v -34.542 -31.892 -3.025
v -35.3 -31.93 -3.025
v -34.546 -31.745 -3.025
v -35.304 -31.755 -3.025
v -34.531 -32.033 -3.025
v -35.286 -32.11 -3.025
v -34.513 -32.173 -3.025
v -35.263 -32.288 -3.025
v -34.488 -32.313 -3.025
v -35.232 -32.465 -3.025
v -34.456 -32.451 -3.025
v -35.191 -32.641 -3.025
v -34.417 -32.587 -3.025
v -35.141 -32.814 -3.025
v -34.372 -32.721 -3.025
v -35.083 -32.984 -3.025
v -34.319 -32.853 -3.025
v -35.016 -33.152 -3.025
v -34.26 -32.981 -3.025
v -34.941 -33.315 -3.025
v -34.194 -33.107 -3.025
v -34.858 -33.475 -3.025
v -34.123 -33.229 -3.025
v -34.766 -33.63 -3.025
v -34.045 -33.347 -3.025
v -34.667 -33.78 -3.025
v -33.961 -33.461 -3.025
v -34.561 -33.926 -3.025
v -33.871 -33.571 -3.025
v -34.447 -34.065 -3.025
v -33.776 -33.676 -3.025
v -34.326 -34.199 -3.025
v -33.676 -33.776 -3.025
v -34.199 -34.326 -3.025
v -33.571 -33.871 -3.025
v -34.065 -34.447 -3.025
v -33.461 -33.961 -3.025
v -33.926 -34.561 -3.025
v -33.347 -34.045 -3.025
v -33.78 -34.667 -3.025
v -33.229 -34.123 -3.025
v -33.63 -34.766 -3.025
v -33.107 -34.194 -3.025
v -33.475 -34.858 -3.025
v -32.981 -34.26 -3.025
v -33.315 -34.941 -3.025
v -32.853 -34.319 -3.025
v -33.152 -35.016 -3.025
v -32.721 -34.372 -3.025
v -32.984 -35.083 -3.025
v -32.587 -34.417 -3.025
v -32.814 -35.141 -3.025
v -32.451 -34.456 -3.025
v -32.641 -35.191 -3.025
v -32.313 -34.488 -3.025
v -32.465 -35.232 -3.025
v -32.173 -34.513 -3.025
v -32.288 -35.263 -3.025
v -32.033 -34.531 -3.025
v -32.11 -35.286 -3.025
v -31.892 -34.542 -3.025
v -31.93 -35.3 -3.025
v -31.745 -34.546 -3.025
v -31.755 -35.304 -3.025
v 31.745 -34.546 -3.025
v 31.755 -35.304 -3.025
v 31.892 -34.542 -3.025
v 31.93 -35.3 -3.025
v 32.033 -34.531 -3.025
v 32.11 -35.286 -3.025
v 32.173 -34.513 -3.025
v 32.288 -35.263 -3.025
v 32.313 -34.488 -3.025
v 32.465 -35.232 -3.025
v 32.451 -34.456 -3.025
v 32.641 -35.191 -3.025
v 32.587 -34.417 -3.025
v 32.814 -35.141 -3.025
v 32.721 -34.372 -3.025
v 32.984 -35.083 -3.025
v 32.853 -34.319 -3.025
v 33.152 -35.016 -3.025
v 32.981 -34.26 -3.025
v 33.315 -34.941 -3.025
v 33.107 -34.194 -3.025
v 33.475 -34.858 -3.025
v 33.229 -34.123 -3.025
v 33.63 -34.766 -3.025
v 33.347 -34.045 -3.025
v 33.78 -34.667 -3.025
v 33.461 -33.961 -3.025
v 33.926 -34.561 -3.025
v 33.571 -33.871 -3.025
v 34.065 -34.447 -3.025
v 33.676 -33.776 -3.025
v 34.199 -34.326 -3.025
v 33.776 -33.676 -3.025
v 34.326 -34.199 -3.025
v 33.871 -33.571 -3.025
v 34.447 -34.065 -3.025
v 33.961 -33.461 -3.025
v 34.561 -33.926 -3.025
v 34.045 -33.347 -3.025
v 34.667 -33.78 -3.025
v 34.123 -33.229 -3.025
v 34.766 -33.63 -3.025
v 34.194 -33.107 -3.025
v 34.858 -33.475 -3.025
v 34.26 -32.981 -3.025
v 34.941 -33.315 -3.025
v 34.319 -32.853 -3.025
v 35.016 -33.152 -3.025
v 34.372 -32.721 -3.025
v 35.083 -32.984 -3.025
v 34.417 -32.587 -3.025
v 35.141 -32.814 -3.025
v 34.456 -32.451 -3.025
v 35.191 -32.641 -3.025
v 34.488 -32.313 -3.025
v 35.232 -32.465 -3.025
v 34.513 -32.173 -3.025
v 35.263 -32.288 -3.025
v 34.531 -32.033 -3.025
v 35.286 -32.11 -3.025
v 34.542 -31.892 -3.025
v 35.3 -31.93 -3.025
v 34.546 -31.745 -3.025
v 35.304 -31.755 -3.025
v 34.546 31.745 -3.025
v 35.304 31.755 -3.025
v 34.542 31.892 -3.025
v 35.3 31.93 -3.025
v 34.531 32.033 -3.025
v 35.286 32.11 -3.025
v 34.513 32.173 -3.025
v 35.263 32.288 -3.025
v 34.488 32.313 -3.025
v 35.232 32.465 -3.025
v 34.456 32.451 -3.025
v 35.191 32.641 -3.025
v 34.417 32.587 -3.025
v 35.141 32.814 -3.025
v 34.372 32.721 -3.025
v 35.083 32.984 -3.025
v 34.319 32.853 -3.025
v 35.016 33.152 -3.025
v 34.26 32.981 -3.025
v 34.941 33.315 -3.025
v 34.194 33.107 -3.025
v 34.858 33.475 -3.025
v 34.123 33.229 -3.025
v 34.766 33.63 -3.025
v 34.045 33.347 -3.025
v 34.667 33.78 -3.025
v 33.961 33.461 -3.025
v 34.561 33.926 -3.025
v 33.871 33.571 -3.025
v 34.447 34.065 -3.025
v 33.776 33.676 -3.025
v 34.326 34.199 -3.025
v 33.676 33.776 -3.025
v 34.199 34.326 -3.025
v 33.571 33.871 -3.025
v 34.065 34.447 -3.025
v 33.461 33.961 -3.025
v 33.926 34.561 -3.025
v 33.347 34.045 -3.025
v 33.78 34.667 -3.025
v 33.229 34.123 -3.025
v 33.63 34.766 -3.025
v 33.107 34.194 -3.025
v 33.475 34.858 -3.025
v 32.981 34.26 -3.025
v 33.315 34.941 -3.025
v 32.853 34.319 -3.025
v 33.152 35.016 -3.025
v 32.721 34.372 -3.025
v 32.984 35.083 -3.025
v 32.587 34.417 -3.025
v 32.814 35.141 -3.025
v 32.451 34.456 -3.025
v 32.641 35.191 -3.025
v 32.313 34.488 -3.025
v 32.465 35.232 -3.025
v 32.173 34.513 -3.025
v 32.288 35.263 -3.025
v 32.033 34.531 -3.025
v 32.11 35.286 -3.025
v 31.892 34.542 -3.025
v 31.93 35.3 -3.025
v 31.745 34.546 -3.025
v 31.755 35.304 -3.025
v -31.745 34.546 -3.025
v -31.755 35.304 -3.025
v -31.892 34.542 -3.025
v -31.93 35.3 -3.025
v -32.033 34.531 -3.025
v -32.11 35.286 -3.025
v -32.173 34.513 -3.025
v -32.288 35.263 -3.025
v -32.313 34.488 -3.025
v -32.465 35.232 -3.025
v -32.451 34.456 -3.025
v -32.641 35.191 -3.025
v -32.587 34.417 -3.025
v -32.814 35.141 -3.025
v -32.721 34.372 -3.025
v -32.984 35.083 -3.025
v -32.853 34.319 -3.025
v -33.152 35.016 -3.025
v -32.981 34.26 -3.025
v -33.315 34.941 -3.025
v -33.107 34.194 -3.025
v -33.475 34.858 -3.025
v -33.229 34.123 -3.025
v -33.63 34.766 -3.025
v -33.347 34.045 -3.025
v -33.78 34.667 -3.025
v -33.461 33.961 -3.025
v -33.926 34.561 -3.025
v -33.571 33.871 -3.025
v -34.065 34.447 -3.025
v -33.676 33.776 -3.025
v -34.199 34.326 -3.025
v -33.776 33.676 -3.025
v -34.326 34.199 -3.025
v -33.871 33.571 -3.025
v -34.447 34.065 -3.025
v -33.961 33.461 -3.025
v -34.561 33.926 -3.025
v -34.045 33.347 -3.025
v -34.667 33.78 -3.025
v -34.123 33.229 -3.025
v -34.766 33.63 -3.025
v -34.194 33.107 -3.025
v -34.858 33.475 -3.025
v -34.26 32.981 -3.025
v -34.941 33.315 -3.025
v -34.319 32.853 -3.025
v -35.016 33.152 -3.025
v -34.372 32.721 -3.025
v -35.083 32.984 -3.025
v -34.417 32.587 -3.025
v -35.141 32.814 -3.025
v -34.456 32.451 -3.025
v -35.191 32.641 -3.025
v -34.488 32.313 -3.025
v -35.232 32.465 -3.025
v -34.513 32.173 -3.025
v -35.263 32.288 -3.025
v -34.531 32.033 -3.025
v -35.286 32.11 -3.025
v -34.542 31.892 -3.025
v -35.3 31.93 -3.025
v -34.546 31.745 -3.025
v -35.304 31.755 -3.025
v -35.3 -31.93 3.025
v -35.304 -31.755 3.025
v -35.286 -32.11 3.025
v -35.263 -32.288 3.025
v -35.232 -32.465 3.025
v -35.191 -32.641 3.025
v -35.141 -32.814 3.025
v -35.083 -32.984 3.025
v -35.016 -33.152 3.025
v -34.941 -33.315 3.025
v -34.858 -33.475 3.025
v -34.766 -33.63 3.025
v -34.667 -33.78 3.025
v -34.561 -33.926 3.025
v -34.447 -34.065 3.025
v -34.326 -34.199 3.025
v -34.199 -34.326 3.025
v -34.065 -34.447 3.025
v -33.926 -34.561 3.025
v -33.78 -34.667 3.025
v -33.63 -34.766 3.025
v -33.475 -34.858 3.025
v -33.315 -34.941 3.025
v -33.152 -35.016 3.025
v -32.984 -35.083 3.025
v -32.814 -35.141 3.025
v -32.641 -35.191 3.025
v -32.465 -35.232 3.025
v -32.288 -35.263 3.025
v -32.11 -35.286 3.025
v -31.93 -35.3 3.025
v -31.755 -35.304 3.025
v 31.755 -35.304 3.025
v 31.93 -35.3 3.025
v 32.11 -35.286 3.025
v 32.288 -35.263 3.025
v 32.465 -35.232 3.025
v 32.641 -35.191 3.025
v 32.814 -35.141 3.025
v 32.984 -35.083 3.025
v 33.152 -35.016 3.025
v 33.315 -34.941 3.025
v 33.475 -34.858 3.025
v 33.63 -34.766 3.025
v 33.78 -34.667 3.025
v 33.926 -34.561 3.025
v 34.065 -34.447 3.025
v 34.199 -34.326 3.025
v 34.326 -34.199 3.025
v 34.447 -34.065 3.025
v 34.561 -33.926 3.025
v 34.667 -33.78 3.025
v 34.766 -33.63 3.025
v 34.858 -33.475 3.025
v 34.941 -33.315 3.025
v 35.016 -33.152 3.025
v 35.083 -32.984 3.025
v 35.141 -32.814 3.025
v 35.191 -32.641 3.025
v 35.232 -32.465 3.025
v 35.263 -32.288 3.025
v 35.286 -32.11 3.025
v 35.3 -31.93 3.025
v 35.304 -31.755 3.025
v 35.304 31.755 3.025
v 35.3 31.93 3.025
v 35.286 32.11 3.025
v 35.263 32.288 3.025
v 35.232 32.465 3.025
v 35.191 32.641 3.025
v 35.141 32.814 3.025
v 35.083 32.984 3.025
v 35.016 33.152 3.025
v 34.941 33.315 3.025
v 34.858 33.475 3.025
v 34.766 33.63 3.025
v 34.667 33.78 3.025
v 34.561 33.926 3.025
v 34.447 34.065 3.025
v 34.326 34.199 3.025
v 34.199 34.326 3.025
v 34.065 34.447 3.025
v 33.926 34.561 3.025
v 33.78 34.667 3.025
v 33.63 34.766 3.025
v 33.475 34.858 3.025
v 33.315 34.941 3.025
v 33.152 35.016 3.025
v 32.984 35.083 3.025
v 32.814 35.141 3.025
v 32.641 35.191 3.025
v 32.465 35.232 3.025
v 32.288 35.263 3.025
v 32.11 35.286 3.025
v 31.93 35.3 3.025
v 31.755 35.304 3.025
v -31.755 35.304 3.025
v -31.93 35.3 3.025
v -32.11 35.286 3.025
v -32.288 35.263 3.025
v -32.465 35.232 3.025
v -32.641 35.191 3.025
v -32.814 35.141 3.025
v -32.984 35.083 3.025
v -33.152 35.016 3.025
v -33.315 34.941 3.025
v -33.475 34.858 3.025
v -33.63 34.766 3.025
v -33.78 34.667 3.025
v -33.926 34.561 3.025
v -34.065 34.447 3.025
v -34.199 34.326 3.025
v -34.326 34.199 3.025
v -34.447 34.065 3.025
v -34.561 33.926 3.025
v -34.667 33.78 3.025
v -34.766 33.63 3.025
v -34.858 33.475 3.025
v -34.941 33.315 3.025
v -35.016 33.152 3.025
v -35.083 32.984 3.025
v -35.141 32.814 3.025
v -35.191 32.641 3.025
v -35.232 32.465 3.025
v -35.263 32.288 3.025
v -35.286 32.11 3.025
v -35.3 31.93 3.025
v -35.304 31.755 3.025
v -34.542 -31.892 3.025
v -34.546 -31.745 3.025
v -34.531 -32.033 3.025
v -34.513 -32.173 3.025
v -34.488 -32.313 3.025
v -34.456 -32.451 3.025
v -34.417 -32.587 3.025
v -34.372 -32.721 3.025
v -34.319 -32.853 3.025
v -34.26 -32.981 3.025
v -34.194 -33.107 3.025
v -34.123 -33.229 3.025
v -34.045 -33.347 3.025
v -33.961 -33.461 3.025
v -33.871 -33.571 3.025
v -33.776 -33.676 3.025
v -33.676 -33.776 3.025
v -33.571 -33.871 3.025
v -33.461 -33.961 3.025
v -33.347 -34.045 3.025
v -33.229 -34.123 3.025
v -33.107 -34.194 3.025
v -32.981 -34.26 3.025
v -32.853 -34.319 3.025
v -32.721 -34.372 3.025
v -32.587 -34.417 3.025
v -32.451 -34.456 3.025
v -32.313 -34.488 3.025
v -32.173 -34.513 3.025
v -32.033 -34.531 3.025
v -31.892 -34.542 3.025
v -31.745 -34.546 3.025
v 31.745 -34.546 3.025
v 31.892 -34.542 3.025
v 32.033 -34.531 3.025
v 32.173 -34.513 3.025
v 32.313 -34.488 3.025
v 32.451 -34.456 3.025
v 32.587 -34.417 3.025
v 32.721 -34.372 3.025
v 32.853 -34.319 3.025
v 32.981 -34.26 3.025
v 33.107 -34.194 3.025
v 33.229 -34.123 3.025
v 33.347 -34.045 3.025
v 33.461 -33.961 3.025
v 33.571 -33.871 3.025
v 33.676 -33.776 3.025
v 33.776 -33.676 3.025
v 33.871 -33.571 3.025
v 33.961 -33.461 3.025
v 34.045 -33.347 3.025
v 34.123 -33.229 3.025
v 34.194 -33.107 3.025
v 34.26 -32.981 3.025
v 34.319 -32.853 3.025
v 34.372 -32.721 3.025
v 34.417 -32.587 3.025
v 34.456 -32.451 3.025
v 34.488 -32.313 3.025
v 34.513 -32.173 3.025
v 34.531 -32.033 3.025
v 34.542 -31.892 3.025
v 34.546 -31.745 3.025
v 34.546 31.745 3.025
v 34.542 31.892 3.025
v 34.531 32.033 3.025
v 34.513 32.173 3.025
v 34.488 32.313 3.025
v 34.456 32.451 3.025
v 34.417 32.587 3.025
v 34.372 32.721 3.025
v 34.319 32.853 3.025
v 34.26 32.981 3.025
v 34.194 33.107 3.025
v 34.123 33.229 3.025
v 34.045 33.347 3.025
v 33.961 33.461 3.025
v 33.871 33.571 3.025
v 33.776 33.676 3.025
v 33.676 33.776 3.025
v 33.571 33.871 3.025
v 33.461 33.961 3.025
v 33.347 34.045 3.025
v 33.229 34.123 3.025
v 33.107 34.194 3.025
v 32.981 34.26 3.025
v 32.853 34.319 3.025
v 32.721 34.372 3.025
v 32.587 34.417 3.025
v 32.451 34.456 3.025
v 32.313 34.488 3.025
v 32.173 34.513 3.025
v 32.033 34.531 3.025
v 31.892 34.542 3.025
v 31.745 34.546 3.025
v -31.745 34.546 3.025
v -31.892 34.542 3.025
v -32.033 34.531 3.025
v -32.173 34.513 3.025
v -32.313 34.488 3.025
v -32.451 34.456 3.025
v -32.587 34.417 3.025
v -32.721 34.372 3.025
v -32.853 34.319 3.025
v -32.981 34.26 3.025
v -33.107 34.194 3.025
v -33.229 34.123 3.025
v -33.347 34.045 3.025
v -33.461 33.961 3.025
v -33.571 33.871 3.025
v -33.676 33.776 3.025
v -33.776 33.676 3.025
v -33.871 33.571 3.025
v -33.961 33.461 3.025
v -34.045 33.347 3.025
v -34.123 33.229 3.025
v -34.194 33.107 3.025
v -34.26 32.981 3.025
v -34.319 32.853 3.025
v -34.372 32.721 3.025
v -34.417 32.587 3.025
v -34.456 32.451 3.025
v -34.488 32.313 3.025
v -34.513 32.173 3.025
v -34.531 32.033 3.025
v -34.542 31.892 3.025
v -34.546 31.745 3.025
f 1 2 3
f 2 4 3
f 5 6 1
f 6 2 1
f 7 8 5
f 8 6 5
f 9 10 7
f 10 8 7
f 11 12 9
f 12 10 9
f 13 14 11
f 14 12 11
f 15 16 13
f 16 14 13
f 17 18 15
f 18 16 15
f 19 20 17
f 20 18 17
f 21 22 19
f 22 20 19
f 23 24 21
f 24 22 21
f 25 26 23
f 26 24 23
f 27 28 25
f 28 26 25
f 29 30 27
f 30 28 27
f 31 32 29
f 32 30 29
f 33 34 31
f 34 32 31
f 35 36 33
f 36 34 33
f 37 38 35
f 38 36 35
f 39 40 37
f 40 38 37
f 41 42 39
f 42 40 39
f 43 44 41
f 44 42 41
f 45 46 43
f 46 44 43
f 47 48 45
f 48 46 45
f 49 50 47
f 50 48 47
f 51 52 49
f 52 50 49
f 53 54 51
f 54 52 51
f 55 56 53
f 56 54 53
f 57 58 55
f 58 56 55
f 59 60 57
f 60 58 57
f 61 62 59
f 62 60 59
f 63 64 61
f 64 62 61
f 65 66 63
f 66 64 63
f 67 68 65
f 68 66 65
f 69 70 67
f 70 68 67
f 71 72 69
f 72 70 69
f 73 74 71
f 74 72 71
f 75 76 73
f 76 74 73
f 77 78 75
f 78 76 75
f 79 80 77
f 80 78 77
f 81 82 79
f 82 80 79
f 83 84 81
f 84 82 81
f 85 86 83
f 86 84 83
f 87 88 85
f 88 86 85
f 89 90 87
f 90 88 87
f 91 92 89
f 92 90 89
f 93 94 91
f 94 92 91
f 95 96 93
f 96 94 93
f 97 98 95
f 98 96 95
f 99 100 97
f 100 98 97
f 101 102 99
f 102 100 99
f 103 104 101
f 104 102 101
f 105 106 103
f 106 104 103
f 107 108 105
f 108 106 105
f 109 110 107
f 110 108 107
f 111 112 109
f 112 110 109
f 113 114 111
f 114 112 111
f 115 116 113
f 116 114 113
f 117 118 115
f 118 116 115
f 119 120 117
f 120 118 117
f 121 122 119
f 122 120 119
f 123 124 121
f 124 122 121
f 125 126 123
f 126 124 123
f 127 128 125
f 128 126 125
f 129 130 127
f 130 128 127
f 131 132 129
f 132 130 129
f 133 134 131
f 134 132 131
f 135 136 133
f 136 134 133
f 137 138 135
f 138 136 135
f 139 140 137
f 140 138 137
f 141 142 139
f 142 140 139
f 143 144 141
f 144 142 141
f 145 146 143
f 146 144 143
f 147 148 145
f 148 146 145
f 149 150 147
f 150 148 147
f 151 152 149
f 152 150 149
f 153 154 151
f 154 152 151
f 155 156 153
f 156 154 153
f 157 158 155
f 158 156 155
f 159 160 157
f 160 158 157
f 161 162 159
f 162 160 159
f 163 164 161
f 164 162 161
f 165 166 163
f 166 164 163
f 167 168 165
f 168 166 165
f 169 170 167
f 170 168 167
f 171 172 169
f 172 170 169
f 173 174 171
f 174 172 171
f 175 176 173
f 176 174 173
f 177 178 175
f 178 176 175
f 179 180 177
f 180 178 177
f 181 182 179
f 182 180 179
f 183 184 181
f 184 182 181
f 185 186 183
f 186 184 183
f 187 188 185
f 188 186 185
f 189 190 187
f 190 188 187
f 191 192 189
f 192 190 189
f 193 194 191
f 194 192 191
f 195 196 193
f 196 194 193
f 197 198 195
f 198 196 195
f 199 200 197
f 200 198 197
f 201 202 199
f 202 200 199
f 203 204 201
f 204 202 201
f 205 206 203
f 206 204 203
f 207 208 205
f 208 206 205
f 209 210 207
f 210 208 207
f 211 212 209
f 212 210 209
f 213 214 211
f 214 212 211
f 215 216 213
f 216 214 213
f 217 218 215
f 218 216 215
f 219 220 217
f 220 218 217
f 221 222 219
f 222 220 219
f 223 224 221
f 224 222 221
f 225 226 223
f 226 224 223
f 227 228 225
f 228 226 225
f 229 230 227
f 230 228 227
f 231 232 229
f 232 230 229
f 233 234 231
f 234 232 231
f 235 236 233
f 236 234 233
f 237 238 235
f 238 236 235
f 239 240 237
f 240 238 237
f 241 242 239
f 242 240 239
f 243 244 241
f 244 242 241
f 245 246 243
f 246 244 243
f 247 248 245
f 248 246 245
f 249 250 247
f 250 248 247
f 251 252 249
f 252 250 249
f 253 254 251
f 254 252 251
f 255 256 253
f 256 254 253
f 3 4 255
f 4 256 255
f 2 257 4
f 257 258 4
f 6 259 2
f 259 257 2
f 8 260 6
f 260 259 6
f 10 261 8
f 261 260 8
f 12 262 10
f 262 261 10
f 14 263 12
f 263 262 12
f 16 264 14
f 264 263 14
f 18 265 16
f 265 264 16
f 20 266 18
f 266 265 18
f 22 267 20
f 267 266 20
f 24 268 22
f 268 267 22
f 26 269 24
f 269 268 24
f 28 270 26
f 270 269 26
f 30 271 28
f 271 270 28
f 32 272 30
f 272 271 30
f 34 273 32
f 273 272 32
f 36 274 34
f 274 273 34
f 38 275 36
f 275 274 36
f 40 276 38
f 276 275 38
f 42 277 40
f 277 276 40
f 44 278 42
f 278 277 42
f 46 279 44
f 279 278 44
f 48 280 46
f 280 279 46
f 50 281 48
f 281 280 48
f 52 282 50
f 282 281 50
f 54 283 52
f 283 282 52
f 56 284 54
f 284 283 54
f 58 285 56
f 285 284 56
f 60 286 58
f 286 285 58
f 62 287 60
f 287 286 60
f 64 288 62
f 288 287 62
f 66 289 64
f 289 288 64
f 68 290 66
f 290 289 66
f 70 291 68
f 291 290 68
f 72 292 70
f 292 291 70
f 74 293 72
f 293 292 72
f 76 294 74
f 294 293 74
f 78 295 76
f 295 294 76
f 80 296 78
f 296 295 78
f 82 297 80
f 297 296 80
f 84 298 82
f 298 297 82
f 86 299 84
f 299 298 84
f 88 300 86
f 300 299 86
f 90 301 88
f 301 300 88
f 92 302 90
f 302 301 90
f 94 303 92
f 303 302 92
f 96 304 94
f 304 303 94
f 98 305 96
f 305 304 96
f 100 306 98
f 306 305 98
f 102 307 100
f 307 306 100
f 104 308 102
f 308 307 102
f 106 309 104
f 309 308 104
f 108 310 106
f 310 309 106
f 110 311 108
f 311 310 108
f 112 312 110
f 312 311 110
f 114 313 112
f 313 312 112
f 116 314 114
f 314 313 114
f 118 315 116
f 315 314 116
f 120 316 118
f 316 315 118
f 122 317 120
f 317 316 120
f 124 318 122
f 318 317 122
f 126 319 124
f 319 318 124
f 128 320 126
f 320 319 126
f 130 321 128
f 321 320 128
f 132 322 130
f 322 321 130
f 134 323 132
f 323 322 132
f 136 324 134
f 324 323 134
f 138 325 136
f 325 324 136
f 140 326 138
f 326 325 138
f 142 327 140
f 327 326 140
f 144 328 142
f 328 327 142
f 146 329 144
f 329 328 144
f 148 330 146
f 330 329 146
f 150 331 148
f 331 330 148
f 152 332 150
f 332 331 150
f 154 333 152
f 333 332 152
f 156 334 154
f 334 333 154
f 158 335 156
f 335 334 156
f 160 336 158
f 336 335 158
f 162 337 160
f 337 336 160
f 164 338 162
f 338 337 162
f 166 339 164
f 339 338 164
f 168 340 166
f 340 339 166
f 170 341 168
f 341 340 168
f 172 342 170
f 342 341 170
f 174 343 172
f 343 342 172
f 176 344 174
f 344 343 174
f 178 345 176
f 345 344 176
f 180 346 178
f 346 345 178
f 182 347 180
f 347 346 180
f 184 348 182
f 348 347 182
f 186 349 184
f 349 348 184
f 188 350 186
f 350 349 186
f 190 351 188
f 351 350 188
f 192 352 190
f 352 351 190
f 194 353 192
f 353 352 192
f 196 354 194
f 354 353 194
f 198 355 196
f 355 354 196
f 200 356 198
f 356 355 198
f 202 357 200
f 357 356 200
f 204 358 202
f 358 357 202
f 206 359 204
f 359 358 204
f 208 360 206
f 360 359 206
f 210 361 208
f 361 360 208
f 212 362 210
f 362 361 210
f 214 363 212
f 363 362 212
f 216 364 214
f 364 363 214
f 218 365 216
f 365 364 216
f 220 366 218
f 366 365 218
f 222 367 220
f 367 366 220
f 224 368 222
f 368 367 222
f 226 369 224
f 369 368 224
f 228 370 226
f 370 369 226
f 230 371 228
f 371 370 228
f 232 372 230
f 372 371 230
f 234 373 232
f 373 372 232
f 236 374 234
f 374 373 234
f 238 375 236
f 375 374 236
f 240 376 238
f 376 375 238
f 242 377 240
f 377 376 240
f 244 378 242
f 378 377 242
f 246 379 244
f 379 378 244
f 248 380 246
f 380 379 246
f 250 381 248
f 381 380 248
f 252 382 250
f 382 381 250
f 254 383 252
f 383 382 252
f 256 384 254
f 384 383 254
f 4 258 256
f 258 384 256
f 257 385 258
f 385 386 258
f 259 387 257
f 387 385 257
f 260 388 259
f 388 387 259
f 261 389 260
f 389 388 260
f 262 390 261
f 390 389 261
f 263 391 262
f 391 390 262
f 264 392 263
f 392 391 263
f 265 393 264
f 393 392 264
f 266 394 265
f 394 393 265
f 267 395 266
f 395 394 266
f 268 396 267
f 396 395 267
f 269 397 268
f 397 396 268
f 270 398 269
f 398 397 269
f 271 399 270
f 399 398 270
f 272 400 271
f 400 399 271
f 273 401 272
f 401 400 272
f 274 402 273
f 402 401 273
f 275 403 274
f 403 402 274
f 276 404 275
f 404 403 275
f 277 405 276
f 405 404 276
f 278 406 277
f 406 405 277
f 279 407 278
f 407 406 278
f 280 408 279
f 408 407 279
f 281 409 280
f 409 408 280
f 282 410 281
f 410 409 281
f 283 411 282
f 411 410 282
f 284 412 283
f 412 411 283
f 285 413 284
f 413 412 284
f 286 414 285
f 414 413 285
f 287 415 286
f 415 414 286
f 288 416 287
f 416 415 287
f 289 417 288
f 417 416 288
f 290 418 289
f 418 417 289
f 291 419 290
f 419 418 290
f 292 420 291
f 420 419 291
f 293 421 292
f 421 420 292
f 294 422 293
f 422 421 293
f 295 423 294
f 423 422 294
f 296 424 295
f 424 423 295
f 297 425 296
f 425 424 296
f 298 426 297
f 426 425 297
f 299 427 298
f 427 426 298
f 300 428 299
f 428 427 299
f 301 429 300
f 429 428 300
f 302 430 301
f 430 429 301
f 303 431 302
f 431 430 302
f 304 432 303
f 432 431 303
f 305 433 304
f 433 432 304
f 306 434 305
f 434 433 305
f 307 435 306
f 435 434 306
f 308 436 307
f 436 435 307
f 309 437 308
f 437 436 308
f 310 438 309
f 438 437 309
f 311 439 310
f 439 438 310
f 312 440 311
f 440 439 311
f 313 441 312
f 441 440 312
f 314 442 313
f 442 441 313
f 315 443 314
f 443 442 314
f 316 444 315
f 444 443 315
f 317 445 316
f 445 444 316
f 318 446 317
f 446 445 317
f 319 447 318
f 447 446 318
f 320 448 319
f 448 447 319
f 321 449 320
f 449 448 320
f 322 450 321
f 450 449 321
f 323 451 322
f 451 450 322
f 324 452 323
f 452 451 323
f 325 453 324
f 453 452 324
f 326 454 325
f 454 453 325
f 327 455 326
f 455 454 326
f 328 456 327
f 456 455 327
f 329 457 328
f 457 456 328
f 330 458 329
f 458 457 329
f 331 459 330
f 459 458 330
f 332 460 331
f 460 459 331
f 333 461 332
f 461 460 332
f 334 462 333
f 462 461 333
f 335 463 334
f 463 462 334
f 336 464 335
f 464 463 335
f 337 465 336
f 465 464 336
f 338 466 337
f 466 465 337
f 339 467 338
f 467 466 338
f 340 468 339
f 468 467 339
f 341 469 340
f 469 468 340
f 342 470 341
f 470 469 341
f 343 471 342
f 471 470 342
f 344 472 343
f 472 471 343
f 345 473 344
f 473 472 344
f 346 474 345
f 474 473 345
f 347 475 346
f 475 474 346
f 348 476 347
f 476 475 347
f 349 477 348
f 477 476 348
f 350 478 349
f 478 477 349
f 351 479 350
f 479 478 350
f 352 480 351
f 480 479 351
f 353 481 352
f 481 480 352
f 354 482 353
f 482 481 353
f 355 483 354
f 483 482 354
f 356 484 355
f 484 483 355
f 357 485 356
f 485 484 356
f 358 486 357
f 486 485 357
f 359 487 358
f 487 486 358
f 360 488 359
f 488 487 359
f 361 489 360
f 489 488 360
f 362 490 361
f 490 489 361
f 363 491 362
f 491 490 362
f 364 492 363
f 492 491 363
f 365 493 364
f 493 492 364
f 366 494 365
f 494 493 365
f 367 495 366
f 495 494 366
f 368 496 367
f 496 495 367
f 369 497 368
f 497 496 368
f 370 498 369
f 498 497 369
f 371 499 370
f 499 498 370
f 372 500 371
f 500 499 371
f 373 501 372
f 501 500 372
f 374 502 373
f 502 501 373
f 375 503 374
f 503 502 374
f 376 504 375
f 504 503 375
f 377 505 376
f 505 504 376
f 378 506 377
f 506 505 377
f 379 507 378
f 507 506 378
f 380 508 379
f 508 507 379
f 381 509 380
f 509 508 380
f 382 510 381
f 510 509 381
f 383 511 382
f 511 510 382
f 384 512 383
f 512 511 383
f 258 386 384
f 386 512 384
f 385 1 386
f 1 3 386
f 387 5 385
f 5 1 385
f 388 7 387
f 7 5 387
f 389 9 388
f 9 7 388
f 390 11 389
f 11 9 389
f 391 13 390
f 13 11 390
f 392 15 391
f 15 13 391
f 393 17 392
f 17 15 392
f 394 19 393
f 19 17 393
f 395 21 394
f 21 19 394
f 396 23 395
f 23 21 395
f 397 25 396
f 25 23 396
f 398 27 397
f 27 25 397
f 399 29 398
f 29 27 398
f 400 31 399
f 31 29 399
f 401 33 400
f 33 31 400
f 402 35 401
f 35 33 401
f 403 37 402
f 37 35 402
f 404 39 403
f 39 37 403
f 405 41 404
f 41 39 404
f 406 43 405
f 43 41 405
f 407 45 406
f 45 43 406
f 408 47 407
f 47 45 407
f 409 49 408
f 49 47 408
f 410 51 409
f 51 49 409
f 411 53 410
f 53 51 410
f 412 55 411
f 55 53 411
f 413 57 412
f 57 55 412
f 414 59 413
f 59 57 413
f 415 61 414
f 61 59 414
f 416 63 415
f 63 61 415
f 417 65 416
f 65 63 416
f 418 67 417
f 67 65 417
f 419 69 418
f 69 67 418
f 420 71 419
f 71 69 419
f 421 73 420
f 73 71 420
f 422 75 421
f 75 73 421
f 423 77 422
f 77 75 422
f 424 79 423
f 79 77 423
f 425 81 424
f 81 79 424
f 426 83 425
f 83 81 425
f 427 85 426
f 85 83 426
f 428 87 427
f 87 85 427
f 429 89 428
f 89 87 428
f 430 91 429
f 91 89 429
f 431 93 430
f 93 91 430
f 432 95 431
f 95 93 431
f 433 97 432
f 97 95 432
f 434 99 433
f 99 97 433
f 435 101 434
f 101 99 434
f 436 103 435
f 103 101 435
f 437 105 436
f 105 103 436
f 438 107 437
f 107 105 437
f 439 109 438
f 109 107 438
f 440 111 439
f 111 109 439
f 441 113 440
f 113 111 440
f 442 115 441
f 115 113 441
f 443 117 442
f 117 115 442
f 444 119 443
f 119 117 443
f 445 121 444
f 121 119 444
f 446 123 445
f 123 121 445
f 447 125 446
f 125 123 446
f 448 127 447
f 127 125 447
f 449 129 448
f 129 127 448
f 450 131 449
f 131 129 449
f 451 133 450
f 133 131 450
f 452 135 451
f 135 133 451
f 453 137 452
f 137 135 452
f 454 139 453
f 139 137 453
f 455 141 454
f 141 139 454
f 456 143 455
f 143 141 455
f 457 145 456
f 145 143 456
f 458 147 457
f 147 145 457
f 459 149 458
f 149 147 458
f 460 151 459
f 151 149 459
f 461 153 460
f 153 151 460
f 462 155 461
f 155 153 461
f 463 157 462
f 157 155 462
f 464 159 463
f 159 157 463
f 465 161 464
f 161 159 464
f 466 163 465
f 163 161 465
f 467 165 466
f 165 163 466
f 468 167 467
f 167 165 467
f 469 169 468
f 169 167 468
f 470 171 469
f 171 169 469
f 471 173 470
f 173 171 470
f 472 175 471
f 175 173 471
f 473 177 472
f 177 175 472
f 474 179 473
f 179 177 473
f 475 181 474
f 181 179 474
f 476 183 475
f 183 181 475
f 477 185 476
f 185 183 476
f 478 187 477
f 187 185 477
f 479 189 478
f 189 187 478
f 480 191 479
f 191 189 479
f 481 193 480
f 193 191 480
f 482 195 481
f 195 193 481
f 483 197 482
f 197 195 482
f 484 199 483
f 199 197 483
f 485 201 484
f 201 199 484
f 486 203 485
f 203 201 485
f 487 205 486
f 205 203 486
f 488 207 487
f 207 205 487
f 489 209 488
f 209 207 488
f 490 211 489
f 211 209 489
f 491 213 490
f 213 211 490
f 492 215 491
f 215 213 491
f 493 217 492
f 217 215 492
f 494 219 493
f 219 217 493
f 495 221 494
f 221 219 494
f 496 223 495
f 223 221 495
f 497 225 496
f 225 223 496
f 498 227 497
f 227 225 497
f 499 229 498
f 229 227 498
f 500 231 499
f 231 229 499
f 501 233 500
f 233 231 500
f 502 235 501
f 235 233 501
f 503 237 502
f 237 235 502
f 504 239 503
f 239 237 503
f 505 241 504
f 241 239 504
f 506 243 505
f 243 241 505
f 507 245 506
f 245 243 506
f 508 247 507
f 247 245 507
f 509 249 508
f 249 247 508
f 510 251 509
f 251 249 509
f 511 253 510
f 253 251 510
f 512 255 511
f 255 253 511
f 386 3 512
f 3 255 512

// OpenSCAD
// SegmentedBox0.1
// 
// Prototype stackable sections.
// See 2026-timelog.txt#2026-01-02-modular-brick-holders for initial thoughts.

section_size_atoms = [6,6,1];
part = "glue"; // ["glue","section"]
connector_surface_offset = "-0.15mm";
outer_surface_offset = "-0.1mm";
$fn = 128;

module __segmentedbox0__end_params() { }

use <../lib/TOGMod1.scad>
use <../lib/TOGPath1.scad>
use <../lib/TOGPolyhedronLib1.scad>
use <../lib/TOGUnits1.scad>

inch = 254/10;
atom = 127/10;

groove_width_mm = inch/24;
groove_corner_radius_mm = inch/8;

wall_thickness_mm = atom/2;

connector_surface_offset_mm = togunits1_to_mm(connector_surface_offset);
outer_surface_offset_mm     = togunits1_to_mm(outer_surface_offset);

/*
function segmentedbox0_make_rect_rath(size, corner_radius) =
	let( cops = [["round", corner_radius]] )
	["togpath1-rath",
		["togpath1-rathnode", [ size[0]/2,  size[1]/2], each cops],
		["togpath1-rathnode", [-size[0]/2,  size[1]/2], each cops],
		["togpath1-rathnode", [-size[0]/2, -size[1]/2], each cops],
		["togpath1-rathnode", [ size[0]/2, -size[1]/2], each cops],
	];
*/

/*
function segmentedbox0_make_groove(center_rath, xy_thickness, z_thickness, xy_surface_offset, z_surface_offset) =
	let( z0 = -z_thickness/2 - z_surface_offset )
	let( z1 =  z_thickness/2 + z_surface_offset )
	tphl1_make_polyhedron_from_layer_function(
		[
			[z0, 0 + xy_thickness/2 + xy_surface_offset],
			[z1, 0 + xy_thickness/2 + xy_surface_offset],
			[z1, 0 - xy_thickness/2 - xy_surface_offset],
			[z0, 0 - xy_thickness/2 - xy_surface_offset],
			[z0, 0 + xy_thickness/2 + xy_surface_offset],
		],
		function(zo) togpath1_rath_to_polypoints(
			togpath1_offset_rath(center_rath, zo[1])
		),
		layer_points_transform = "key0-to-z",
		cap_bottom = false,
		cap_top = false
	);
*/

function segmentedbox0_make_ring(center_rath, cross_section_rath) =
	let( cs_polypoints = togpath1_rath_to_polypoints(cross_section_rath) )
	tphl1_make_polyhedron_from_layer_function(
		[
			each cs_polypoints,
			cs_polypoints[0],
		],
		function(oz) togpath1_rath_to_polypoints(
			togpath1_offset_rath(center_rath, oz[0])
		),
		layer_points_transform = "key1-to-z",
		cap_bottom = false,
		cap_top = false
	);

function segmentedbox0_make_groove(center_rath, xy_thickness, z_thickness, surface_offset) =
	segmentedbox0_make_ring(center_rath, togpath1_make_rectangle_rath([xy_thickness, z_thickness], corner_ops=[["offset", surface_offset]]));

wall_center_rath = togpath1_make_rectangle_rath(
	[(section_size_atoms[0]-0.5)*atom, (section_size_atoms[1]-0.5)*atom],
	corner_ops = [["round", groove_corner_radius_mm]]
);

togmod1_domodule(
	let( glue = segmentedbox0_make_groove(
		center_rath = wall_center_rath,
		xy_thickness = groove_width_mm,
		z_thickness = 6.35,
		surface_offset = connector_surface_offset_mm
	) )
	let( groove = segmentedbox0_make_groove(
		center_rath = wall_center_rath,
		xy_thickness = groove_width_mm,
		z_thickness = 6.35,
		surface_offset = -connector_surface_offset_mm
	) )
	let( section = ["difference",
		segmentedbox0_make_ring(
			wall_center_rath,
			togpath1_make_rectangle_rath(
				[wall_thickness_mm, section_size_atoms[2]*atom - inch/8],
				corner_ops=[["bevel", inch/16], ["offset", outer_surface_offset_mm]]
			)
		),
		
		for(zm=[-1,+1]) ["translate", [0,0,zm*section_size_atoms[2]*atom/2], groove],
	] )
	
	part == "glue" ? glue :
	part == "section" ? section :
	assert(false, str("Unknown part: '", part, "'"))
);
